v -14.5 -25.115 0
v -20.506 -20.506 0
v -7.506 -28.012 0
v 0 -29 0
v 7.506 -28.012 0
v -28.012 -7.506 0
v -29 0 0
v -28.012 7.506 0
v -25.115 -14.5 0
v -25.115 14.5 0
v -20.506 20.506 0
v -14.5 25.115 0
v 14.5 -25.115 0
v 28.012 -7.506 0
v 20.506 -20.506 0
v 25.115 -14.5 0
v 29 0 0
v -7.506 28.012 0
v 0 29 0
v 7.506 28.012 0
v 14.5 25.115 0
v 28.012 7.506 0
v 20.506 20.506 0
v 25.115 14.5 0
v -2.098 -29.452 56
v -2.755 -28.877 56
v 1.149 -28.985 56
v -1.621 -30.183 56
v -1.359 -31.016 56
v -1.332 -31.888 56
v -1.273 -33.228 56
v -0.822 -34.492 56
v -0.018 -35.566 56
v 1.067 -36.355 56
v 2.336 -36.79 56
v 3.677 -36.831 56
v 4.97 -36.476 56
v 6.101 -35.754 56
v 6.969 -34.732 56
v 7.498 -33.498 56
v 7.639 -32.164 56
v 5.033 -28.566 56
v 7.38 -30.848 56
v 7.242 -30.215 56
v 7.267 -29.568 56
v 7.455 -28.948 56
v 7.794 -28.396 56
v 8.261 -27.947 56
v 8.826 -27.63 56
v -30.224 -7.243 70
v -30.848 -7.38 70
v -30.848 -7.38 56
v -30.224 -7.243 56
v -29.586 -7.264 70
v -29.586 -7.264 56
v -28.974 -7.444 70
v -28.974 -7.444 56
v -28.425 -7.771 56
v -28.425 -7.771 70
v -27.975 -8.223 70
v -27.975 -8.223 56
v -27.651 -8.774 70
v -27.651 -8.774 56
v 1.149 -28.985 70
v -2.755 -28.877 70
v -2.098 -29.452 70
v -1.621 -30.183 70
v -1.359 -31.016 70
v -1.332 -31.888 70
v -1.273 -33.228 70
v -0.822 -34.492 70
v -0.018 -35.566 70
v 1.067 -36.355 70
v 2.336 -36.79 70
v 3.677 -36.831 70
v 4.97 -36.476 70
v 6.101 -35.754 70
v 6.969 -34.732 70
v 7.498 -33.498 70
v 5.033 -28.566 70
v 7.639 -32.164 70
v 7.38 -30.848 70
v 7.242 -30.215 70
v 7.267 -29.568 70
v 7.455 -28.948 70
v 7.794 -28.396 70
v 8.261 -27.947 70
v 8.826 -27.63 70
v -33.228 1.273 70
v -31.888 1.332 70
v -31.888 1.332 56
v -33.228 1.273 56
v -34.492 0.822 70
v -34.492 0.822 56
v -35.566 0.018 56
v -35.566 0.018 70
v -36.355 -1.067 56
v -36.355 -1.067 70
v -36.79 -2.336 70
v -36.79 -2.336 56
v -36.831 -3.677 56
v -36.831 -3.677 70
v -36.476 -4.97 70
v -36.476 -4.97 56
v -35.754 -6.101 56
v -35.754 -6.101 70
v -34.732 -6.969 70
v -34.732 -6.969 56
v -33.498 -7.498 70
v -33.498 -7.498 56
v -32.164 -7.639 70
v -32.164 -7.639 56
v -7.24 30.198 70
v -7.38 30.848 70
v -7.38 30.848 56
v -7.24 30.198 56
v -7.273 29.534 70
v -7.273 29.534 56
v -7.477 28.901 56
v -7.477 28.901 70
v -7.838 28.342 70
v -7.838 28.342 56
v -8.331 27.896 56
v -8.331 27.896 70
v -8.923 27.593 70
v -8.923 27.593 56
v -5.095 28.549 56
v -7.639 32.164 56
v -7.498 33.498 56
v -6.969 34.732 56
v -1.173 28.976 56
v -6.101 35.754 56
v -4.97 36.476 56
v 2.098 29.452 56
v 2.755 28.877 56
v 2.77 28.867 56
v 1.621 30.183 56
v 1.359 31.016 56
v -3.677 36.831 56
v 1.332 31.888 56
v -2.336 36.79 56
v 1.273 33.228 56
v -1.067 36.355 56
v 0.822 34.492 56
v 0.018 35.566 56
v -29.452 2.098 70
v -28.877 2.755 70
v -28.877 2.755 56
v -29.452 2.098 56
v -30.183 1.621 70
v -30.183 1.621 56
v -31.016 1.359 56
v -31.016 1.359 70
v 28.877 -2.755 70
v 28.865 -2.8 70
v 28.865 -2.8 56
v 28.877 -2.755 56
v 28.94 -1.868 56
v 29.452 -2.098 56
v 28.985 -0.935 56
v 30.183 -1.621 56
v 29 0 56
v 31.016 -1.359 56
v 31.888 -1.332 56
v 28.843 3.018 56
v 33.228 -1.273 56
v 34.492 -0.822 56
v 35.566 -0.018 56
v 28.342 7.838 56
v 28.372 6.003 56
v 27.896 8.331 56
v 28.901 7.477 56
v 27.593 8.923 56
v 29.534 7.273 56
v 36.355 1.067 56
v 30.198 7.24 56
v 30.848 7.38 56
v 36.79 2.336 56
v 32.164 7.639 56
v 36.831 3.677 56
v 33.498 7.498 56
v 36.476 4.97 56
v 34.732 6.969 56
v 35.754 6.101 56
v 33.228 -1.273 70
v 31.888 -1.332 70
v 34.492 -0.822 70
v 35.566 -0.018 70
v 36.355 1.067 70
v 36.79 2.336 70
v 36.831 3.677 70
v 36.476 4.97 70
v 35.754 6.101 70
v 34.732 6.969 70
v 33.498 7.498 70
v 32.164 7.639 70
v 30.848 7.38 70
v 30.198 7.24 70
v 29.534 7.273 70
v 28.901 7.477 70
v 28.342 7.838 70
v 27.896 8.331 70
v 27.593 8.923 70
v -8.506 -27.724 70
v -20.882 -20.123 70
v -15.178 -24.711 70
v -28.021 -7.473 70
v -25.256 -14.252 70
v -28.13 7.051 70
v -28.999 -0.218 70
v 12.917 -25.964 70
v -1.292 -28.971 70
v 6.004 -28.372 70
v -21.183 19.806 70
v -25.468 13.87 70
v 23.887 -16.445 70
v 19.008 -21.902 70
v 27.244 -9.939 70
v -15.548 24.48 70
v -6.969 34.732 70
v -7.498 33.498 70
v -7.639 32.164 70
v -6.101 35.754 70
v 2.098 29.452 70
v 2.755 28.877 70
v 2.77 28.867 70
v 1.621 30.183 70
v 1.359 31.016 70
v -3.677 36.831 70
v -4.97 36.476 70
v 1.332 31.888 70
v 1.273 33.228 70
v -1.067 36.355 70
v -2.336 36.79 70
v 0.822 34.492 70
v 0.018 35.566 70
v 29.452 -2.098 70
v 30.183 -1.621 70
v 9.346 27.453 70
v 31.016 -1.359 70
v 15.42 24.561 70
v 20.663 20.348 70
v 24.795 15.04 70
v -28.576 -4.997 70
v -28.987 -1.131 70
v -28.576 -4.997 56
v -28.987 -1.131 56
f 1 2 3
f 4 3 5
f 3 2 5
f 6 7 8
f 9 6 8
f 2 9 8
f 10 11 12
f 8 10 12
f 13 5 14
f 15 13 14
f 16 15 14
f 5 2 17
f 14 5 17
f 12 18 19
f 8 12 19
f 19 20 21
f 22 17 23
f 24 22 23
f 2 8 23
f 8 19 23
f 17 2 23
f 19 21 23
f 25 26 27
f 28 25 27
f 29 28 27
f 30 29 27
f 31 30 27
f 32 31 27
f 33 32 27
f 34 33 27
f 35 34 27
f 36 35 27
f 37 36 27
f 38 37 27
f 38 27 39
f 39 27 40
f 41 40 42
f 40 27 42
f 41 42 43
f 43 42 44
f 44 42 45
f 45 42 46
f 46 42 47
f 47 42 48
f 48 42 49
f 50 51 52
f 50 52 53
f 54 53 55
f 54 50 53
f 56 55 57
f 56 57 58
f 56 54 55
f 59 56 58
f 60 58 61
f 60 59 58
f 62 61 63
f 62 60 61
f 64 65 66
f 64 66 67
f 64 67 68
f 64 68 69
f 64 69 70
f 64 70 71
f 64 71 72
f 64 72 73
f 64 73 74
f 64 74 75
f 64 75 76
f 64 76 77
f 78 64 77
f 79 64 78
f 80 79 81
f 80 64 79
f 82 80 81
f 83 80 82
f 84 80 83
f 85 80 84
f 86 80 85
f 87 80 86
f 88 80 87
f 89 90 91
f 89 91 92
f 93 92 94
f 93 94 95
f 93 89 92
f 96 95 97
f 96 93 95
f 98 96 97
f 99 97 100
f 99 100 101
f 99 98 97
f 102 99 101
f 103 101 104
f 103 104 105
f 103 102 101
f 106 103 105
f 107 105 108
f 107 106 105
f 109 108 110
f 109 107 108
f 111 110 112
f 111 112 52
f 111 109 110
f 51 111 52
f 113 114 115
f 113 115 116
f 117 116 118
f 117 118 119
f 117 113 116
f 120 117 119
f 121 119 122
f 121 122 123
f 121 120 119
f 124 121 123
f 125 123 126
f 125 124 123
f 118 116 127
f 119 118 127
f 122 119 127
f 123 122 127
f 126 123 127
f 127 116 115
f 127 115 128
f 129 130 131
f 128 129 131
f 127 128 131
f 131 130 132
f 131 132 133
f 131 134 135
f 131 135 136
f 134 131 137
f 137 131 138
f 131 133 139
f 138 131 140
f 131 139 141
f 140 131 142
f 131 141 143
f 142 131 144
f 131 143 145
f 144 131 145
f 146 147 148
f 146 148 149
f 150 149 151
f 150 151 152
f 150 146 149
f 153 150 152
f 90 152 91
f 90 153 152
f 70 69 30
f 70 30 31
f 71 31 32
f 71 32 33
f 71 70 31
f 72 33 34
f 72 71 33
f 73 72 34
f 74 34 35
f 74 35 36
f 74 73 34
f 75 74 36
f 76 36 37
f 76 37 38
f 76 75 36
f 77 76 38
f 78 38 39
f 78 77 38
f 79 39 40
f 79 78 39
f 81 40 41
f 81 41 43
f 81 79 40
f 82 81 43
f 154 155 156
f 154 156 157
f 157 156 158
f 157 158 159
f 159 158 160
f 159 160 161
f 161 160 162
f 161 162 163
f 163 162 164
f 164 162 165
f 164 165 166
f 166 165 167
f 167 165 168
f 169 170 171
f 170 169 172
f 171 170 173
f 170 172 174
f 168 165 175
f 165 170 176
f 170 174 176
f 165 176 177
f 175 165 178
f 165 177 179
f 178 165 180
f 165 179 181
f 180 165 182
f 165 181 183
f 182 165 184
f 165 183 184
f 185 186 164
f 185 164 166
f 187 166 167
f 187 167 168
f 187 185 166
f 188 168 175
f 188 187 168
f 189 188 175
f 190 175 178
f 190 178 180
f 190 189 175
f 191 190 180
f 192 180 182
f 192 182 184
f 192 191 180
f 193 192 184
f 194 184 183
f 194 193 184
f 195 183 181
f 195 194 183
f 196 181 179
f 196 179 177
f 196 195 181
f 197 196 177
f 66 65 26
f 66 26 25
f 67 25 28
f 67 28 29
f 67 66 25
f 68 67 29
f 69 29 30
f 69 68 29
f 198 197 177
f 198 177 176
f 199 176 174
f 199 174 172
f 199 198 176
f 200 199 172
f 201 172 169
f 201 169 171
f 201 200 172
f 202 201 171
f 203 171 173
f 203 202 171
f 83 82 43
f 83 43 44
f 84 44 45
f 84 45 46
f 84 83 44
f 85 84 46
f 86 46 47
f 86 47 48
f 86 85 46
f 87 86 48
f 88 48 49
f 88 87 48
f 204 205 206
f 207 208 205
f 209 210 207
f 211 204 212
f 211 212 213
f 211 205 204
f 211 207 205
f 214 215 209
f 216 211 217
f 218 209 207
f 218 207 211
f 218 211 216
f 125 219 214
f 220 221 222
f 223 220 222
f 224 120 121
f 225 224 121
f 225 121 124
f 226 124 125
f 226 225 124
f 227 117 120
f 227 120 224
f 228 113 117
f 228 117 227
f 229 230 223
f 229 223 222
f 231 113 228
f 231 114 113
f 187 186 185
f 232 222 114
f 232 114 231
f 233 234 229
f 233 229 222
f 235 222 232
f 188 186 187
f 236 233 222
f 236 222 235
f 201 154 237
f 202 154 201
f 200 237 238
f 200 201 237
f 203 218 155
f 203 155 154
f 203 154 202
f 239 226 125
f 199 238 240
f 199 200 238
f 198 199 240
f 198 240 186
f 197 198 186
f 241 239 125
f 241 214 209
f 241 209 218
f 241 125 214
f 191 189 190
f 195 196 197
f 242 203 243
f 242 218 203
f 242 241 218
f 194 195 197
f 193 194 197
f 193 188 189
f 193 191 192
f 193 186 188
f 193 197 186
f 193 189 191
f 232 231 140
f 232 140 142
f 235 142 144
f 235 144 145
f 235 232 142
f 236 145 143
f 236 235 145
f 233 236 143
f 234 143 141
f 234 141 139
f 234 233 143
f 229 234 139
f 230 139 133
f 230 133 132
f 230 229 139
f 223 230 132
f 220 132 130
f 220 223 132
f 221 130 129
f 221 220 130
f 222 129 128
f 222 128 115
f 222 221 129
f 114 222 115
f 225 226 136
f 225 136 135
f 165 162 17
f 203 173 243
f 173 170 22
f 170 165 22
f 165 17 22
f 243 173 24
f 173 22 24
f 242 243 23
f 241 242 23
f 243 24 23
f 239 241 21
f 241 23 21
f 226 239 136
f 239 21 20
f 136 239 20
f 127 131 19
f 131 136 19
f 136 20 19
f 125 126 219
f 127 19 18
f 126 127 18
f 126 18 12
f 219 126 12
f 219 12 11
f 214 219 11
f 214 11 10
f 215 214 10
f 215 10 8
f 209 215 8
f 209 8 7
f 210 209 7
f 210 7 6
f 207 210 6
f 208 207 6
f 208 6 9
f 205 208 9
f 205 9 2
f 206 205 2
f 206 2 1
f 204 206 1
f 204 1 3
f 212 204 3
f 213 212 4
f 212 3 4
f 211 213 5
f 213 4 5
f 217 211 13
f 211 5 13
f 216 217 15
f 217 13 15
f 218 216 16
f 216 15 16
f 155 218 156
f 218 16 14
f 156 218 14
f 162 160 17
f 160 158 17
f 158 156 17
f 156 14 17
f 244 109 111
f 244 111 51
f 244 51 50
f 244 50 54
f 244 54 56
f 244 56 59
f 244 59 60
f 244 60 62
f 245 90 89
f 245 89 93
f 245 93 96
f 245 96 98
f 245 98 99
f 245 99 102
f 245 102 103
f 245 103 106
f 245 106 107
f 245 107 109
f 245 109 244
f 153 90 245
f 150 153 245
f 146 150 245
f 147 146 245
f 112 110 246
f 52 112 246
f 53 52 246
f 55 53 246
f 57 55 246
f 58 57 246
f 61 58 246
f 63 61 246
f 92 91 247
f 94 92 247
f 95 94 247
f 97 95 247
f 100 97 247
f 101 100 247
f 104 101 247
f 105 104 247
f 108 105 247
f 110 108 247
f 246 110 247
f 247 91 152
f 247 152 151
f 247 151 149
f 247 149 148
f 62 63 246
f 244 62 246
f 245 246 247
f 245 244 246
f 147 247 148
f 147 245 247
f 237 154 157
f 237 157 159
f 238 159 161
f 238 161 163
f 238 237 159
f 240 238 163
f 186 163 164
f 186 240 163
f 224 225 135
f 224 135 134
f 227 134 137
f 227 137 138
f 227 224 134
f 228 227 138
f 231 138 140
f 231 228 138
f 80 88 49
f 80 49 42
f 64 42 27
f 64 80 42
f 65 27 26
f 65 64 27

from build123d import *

# Parameters (mm, degrees)
SZKIC1_R                    = 29
DODANIE_WYCI_GNI_CIE1_DEPTH = 70
DODANIE_WYCI_GNI_CIE4_DEPTH = 14


with BuildPart() as part:
    # Szkic1 → Dodanie-wyciągnięcie1 (new body)
    with BuildSketch(Plane.XY):
        Circle(SZKIC1_R)
    extrude(amount=DODANIE_WYCI_GNI_CIE1_DEPTH)

    # Szkic2 → Dodanie-wyciągnięcie4 (add)
    with BuildSketch(Plane.XY.offset(70)):
        with BuildLine():
            ThreePointArc((30.84790374, 7.380401745), (28.900861272, 7.476956762), (27.593197744, 8.922748358))
            ThreePointArc((27.593197744, 8.922748358), (28.64614053, 4.516484552), (29, 0))
            ThreePointArc((29, 0), (28.966113998, -1.401513415), (28.864535183, -2.799751542))
            Line((28.864535183, -2.799751542), (28.877094392, -2.755388077))
            ThreePointArc((28.877094392, -2.755388077), (30.18274059, -1.620828188), (31.888121854, -1.331669269))
            ThreePointArc((31.888121854, -1.331669269), (36.831424825, 3.67669565), (30.84790374, 7.380401745))
        make_face()
        with BuildLine():
            ThreePointArc((7.380401745, -30.84790374), (7.4552326, -28.947937345), (8.825804257, -27.62998238))
            ThreePointArc((8.825804257, -27.62998238), (3.098462136, -28.840941336), (-2.755388077, -28.877094392))
            ThreePointArc((-2.755388077, -28.877094392), (-1.620828188, -30.18274059), (-1.331669269, -31.888121854))
            ThreePointArc((-1.331669269, -31.888121854), (3.67669565, -36.831424825), (7.380401745, -30.84790374))
        make_face()
        with BuildLine():
            ThreePointArc((-27.651486159, -8.774084684), (-28.846317681, -3.071219093), (-28.877094392, 2.755388077))
            ThreePointArc((-28.877094392, 2.755388077), (-30.18274059, 1.620828188), (-31.888121854, 1.331669269))
            ThreePointArc((-31.888121854, 1.331669269), (-36.831424825, -3.67669565), (-30.84790374, -7.380401745))
            ThreePointArc((-30.84790374, -7.380401745), (-28.973547583, -7.443898089), (-27.651486159, -8.774084684))
        make_face()
        with BuildLine():
            Line((2.770143564, 28.867391719), (2.755388077, 28.877094392))
            ThreePointArc((2.755388077, 28.877094392), (1.620828188, 30.18274059), (1.331669269, 31.888121854))
            ThreePointArc((1.331669269, 31.888121854), (-3.67669565, 36.831424825), (-7.380401745, 30.84790374))
            ThreePointArc((-7.380401745, 30.84790374), (-7.476956762, 28.900861272), (-8.922748358, 27.593197744))
            ThreePointArc((-8.922748358, 27.593197744), (-3.141580654, 28.829333516), (2.770143564, 28.867391719))
        make_face()
    extrude(amount=-DODANIE_WYCI_GNI_CIE4_DEPTH)


solid = part.part
